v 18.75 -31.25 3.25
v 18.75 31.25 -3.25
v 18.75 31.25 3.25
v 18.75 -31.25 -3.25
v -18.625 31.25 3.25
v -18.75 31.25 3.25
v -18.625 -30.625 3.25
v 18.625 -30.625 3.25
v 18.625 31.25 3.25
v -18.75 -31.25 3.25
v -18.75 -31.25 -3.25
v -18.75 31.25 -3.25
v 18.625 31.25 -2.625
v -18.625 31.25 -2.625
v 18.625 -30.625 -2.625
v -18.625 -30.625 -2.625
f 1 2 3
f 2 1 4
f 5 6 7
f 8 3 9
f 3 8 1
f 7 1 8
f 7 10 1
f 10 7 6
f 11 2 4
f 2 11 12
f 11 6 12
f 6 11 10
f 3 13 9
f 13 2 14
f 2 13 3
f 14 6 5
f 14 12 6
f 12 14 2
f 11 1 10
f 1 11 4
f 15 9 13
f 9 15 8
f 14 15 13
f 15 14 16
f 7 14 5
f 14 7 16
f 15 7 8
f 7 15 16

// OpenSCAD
// SPDX-License-Identifier: MIT

// Mounting board for the new alarm system

// Show item
mounting=false;
siren=false;
battery=true;

board_length=177.8;
board_width=203.2;
board_height=5;

if (mounting == true) {
    // The replacement mounting board
    cube([board_length, board_width, board_height], center=true);
}

if (siren == true) {
    // Show the siren board - no CAD file available
    cube([105.73, 55.09, 1.5]);
}

if (battery == true) {
    difference() {
        cube([37.5, 62.5, 6.5], center=true);
        translate([0, 0.5, .5])
            cube([37.25, 62.25, 6.25], center=true);

    }
}
